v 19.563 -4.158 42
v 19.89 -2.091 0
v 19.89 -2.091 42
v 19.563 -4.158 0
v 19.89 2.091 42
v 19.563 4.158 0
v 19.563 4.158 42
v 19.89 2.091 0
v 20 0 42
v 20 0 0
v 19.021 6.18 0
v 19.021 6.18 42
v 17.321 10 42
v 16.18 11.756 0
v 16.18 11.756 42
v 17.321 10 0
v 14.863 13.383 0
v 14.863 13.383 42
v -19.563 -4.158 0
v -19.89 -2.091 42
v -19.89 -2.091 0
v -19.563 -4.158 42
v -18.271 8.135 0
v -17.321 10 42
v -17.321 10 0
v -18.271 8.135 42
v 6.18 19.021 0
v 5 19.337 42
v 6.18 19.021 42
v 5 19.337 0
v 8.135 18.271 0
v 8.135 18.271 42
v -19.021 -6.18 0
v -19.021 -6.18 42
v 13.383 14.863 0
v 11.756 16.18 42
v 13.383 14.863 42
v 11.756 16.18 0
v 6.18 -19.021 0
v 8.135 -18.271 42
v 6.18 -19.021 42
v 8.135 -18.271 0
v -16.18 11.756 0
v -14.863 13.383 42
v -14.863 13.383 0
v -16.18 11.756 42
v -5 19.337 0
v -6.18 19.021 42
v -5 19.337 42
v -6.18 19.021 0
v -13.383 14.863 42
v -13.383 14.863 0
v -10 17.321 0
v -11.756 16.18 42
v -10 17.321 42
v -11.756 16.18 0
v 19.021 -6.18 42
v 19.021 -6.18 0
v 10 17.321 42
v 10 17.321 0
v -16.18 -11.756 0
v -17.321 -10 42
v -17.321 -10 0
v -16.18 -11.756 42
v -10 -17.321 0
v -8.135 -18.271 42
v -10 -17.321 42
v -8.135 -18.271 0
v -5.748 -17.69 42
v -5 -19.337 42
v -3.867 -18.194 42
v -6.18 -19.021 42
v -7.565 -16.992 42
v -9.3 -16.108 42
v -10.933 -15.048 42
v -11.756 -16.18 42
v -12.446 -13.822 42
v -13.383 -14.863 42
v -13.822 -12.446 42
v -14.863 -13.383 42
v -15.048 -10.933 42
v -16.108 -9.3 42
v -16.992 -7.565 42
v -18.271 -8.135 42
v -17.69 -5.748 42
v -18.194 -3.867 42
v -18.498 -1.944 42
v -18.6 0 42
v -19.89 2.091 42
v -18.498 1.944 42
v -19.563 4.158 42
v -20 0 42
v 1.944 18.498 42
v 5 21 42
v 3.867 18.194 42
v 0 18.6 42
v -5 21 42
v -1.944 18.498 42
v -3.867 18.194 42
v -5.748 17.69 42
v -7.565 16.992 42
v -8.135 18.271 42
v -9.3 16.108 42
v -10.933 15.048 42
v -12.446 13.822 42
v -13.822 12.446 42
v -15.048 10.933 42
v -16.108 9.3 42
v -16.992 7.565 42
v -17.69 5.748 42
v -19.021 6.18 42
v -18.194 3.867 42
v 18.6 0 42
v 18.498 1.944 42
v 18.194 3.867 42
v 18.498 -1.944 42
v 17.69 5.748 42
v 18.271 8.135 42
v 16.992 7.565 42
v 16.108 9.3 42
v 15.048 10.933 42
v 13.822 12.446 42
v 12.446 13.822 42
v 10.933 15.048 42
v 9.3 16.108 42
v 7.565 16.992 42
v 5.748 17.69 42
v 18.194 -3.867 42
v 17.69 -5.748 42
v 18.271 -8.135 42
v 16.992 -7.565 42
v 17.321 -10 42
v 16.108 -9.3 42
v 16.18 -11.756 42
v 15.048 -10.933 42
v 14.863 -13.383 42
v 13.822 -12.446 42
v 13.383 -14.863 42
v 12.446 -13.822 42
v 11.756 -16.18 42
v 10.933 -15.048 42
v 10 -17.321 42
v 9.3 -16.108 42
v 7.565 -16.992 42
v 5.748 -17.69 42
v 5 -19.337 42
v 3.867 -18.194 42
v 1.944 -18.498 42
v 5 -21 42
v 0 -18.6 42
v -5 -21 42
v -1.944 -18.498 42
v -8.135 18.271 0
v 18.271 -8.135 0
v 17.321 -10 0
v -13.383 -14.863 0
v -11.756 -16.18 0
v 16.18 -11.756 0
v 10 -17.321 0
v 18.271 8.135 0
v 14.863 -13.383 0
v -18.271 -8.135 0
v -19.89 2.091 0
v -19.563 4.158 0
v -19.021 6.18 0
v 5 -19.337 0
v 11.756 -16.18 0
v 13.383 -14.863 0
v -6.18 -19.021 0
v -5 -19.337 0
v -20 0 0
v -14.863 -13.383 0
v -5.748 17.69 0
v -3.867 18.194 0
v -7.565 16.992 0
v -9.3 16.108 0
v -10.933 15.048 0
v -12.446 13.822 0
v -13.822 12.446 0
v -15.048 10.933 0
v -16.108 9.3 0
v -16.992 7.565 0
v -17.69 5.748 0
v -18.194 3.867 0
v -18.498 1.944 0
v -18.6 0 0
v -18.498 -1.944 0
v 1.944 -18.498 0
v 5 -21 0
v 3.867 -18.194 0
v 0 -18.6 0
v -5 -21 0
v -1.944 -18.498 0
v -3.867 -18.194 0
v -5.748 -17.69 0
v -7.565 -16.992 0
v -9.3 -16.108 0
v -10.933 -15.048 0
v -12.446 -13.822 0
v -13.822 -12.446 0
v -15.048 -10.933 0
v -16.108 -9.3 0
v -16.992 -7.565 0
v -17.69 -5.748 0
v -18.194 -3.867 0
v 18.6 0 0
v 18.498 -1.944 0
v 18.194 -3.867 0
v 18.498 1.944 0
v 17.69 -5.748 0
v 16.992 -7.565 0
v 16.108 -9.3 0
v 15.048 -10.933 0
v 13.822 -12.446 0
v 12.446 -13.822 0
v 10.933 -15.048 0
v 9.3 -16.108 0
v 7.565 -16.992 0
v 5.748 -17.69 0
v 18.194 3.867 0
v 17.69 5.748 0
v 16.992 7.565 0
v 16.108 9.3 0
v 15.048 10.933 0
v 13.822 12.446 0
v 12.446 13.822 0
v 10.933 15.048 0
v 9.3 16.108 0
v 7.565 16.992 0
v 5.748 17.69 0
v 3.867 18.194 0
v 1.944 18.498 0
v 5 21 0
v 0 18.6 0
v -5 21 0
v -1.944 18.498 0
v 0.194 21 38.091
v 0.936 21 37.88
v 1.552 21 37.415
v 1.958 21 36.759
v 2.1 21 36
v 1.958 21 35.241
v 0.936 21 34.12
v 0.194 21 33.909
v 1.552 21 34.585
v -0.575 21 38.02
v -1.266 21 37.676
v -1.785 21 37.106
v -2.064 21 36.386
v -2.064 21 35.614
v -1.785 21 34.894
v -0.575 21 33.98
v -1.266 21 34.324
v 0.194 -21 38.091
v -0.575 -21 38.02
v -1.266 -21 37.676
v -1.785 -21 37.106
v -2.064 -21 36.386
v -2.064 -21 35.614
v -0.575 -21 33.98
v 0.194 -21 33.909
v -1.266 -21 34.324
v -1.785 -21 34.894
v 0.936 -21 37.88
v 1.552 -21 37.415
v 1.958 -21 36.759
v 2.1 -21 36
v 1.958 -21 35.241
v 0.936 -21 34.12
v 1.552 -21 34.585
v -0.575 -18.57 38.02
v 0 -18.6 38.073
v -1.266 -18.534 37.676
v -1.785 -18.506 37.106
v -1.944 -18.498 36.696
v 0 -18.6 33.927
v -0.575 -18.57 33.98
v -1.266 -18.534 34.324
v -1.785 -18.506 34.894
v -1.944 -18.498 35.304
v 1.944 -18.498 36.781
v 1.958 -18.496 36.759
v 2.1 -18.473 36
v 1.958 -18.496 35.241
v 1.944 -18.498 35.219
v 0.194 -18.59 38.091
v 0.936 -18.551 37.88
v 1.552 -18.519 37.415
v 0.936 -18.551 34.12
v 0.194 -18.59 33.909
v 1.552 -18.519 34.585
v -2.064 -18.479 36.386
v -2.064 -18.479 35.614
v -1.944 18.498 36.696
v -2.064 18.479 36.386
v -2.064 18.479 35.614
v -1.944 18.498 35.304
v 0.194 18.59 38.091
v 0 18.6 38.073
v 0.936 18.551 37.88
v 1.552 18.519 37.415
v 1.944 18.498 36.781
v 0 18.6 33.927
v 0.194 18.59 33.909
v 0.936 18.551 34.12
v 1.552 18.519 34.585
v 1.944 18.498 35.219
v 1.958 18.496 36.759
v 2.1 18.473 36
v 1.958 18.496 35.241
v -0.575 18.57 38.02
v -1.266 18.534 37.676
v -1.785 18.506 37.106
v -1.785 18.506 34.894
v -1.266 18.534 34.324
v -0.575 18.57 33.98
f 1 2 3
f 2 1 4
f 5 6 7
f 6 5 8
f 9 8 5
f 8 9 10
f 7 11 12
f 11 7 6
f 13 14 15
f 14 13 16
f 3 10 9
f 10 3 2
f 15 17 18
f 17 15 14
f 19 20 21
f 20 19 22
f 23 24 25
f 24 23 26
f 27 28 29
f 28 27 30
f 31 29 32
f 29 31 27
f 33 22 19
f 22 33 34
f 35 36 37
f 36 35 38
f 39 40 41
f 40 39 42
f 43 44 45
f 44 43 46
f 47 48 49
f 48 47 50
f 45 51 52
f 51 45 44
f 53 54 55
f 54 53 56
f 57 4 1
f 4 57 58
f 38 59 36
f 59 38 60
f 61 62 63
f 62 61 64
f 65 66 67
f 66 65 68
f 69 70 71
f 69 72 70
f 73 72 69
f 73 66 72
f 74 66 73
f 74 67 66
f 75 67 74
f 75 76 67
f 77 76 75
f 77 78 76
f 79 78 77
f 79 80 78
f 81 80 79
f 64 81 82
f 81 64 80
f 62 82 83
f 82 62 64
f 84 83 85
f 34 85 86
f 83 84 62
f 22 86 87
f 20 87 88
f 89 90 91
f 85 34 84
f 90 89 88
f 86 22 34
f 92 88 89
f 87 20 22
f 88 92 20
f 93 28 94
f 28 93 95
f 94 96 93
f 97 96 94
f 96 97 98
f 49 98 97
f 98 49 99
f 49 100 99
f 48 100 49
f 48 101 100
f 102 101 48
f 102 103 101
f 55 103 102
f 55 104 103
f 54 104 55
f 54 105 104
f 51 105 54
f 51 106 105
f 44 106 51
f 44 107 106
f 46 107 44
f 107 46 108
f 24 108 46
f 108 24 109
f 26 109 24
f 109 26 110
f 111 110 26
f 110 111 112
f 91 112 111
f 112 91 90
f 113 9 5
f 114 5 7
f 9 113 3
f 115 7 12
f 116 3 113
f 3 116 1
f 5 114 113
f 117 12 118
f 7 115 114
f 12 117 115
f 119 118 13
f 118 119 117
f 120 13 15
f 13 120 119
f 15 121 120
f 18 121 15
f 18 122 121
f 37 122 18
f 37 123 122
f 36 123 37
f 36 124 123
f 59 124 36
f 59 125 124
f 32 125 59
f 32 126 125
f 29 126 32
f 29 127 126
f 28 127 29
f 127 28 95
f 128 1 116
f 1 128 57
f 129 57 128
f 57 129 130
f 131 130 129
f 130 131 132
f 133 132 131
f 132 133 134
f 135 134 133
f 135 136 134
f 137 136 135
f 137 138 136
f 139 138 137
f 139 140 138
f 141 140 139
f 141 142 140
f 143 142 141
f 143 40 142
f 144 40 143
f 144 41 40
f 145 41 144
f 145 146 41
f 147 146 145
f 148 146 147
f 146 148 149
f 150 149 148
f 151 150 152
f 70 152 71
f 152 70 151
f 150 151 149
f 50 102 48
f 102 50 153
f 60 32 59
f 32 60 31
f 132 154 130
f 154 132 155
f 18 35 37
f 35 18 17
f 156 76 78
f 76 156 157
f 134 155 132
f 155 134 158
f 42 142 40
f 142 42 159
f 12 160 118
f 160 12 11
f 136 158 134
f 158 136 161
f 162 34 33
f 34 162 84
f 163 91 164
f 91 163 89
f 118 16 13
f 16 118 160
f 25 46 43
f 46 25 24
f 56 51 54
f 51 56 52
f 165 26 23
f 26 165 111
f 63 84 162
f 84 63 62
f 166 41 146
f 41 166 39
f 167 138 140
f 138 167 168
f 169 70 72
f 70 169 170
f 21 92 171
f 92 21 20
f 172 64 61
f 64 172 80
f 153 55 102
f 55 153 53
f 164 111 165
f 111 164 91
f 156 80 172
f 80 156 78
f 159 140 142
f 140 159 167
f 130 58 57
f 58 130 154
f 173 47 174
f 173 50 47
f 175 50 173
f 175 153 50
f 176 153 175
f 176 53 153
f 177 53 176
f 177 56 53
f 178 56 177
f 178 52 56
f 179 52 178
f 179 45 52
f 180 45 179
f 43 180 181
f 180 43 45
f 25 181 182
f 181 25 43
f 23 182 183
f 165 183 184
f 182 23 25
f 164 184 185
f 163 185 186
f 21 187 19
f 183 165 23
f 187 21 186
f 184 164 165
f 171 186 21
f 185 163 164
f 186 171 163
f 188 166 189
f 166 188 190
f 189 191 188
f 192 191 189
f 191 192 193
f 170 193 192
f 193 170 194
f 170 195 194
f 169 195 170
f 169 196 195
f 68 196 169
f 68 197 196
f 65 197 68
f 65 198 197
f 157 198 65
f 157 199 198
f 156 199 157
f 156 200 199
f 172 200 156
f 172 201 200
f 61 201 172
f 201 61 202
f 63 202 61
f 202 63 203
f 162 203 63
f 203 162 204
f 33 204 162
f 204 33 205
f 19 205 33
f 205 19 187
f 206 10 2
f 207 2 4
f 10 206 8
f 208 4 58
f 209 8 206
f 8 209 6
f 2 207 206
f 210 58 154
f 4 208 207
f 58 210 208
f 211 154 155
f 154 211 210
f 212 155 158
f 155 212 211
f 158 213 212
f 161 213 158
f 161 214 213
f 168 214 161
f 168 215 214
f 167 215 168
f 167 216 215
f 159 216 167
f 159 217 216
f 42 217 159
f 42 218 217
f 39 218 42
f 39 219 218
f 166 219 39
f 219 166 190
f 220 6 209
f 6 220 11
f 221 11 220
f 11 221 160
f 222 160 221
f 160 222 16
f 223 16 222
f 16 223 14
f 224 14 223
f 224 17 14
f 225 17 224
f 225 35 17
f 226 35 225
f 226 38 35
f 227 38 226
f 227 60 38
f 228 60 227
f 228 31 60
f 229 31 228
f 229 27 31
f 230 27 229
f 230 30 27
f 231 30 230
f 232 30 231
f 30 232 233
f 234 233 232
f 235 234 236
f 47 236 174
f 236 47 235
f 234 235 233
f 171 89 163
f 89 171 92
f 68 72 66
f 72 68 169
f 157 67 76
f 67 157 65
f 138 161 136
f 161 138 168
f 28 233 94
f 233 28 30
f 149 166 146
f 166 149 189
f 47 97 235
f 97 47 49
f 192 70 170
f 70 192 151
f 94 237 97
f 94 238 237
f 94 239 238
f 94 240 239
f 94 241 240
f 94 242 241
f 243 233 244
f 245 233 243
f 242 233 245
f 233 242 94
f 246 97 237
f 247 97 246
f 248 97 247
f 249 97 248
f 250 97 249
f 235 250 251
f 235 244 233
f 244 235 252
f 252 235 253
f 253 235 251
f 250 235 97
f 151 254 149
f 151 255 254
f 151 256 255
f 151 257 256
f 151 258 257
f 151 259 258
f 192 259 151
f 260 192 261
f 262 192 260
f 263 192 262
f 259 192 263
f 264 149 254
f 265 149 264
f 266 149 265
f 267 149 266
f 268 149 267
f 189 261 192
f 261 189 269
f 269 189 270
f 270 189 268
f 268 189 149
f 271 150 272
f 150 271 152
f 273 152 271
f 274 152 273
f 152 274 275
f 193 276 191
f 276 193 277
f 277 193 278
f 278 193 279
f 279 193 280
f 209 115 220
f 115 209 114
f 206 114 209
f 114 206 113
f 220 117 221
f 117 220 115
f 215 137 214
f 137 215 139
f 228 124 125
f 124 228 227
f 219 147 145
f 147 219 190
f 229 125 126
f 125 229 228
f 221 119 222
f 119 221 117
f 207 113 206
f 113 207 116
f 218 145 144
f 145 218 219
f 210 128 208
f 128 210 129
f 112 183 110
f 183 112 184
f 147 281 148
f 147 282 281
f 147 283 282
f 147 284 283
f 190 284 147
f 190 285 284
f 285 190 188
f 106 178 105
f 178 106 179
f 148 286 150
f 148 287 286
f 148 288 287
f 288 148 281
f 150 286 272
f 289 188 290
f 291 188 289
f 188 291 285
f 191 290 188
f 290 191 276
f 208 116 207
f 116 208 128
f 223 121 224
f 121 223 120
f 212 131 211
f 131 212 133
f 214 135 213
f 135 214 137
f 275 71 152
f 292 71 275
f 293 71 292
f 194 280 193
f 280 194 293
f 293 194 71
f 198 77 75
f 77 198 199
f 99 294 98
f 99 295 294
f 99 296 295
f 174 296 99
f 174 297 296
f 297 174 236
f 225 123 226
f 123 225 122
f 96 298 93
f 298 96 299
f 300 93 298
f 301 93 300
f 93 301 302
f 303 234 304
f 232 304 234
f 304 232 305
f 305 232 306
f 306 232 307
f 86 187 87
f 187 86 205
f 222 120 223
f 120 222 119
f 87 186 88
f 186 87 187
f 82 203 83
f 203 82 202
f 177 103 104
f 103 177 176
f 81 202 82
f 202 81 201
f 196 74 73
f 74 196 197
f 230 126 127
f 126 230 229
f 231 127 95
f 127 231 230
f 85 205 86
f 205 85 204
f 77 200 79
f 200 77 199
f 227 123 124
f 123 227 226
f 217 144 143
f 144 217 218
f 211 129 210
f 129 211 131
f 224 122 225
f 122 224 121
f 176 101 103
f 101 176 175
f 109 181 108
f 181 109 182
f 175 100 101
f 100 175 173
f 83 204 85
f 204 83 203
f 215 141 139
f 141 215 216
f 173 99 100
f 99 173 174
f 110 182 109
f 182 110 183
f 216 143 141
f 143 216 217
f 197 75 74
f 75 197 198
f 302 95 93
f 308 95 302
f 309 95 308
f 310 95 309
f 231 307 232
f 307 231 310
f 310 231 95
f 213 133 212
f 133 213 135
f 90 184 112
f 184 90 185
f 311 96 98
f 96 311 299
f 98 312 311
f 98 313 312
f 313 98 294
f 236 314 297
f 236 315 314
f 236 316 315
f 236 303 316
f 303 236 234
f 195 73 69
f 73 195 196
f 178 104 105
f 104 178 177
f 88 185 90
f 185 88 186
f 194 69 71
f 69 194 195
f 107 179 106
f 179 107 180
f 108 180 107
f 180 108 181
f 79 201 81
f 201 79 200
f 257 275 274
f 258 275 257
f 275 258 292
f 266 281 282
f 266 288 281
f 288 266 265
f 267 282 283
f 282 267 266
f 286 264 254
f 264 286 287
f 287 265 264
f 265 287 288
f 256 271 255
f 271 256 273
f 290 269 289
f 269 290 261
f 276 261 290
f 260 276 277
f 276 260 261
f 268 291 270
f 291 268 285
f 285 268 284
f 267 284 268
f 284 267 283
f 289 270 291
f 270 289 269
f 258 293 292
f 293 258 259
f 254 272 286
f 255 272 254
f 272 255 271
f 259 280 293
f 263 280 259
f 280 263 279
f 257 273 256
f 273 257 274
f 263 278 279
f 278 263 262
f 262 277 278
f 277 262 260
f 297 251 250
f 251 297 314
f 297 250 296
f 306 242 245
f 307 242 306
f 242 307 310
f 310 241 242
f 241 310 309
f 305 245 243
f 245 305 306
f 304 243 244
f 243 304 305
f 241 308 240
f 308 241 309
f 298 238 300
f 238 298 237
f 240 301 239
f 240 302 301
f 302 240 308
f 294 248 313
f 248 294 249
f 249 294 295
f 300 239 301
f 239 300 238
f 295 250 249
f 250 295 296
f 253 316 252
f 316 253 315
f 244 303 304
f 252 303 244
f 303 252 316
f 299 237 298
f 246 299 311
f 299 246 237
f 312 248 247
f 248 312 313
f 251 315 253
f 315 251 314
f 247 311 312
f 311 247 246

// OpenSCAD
// file: ../shapes.scad
FACES   = 180;
EPSILON = 0.1;
PIN	    = 2.54;


module tube(h=1, inner=0, outer=0, di=0, do=0) {
    rInner = inner > 0 ? inner : di / 2;
    rOuter = outer > 0 ? outer : do / 2;

	if (rInner >= rOuter) echo("ERROR in tube. rOuter must be > rInner.");

	difference() {
		cylinder(h=h, r=rOuter);
		translate([0,0,-EPSILON]) {
			cylinder(h=h + EPSILON*2, r=rInner);
		}
	}
}

module roundedRect(size, r, up="z")
{
	if (up == "x") {
		H = size[0];
		hull()
		{
			translate([0, r, r]) rotate([0, 90, 0]) cylinder(r=r, h=H);
			translate([0, size[1] - r, r]) rotate([0, 90, 0]) cylinder(r=r, h=H);
			translate([0, r, size[2] - r]) rotate([0, 90, 0]) cylinder(r=r, h=H);
			translate([0, size[1] - r, size[2] - r]) rotate([0, 90, 0]) cylinder(r=r, h=H);
		}
	}
	else if (up == "y") {
		H = size[1];
		hull()
		{
			translate([r, 0, r]) rotate([-90, 0, 0]) cylinder(r=r, h=H);
			translate([size[0] - r, 0, r]) rotate([-90, 0, 0]) cylinder(r=r, h=H);
			translate([r, 0, size[2] - r]) rotate([-90, 0, 0]) cylinder(r=r, h=H);
			translate([size[0] - r, 0, size[2] - r]) rotate([-90, 0, 0]) cylinder(r=r, h=H);
		}
	}
	else {
		H = size[2];
		hull()
		{
			translate([r, r, 0])  cylinder(r=r, h=H);
			translate([size[0] - r, r, 0])  cylinder(r=r, h=H);
			translate([r, size[1] - r, 0])  cylinder(r=r, h=H);
			translate([size[0] - r, size[1] - r, 0])  cylinder(r=r, h=H);
		}
	}
}

module cubePair(x, size)
{
	translate([x, 0, 0])
		cube(size=size);
	mirror([1,0,0]) translate([x, 0, 0])
		cube(size=size);
}

module polygonXY(h, points)
{
    linear_extrude(height = h) {
        polygon(points=points);
    }  
}

module polygonYZ(h, points)
{
    multmatrix(m = [ [0, 0, 1, 0],
    				 [1, 0, 0, 0],
    				 [0, 1, 0, 0],
    				 [0, 0, 0, 1]
       			   ])
    linear_extrude(height = h) {
        polygon(points=points);
    }  	
}

module polygonZY(h, points)
{
    multmatrix(m = [ [0, 0, 1, 0],
    				 [0, 1, 0, 0],
    				 [1, 0, 0, 0],
    				 [0, 0, 0, 1]
       			   ])
    linear_extrude(height = h) {
        polygon(points=points);
    }  	
}
module polygonXZ(h, points)
{
    multmatrix(m = [ [1, 0, 0, 0],
    				 [0, 0, 1, 0],
    				 [0, 1, 0, 0],
    				 [0, 0, 0, 1]
       			   ])
    linear_extrude(height = h) {
        polygon(points=points);
    }  	
}


module zCapsule(dz0, dz1, r, roundedRect=0)
{
	if (roundedRect == 0) {
		hull() {
			translate([0, 0, dz0]) rotate([-90, 0, 0]) cylinder(h=50, r=r);
			translate([0, 0, dz1]) rotate([-90, 0, 0]) cylinder(h=50, r=r);
		}
	}
	else {
		if (dz1 < dz0) {
			t = dz0;
			dz0 = dz1;
			dz1 = t;
		}
		hull() {
			translate([r - roundedRect, 0, dz0 - r + roundedRect]) 
				rotate([-90, 0, 0]) cylinder(h=50, r=roundedRect);
			translate([-r + roundedRect, 0, dz0 - r + roundedRect]) 
				rotate([-90, 0, 0]) cylinder(h=50, r=roundedRect);
			translate([r - roundedRect, 0, dz1 + r - roundedRect]) 
				rotate([-90, 0, 0]) cylinder(h=50, r=roundedRect);
			translate([-r + roundedRect, 0, dz1 + r - roundedRect]) 
				rotate([-90, 0, 0]) cylinder(h=50, r=roundedRect);
		}
	}
}

module xRoofCube(size)
{
	x = size[0];
	y = size[1];
	z = size[2];

	polygonXY(h=z, points=[
		[0, 0],
		[x, 0],
		[x, y + x],		// gets the 45 degree angle for printing
		[0, y]
	]);
}

module tubeTriTop(h, do, di, theta=50) {
	tube(h=h, di=di, do=do);
	intersection() {
		cylinder(h=h, d=do);
		a = di / 2;
		b = a / tan(theta);
		union() {
			polygonXY(h=h, points=[
				[0, a], [a, a], [a, a - b]
			]);
			mirror([-1, 0, 0]) polygonXY(h=h, points=[
				[0, a], [a, a], [a, a - b]
			]);
		}
	}
}
// file: dim.scad
M_START = -28.5 + 10.5;
M0 = 0.0;
DZ_BODY = 101.8;
M_FRONT = DZ_BODY - 18.0;   // approximate

D0 = 31.7;

// See: Z_BATTERY_18650 = 65 + 4;
DZ_BATTERY = 65 + 4;

DZ_PCB = 0.975 * 25.4;
DY_PCB_TOP = 9.5;
DY_PCB_BOTTOM = DY_PCB_TOP - 1.6;
DZ_PCB_SECTION = 28.0;
PCB_OFFSET = 3;

// 5, 10, 15mm offsets
DY_PILLAR_TOP = DY_PCB_BOTTOM; // - 10.0;
DX_PCB = 0.90 * 25.4 + 0.2;

DZ_SPKR_HOLDER = 2.0;
DZ_BOLT = 8.0;

M_LED_CONTROL = 11.0;
DZ_LED_CONTROL = 1.45 * 25.4;
DX_LED_CONTROL = 0.7 * 25.4;

M_MC = M_START + DZ_SPKR_HOLDER;
M_BOLT = 65.0;
M_PCB = M_MC + DZ_BATTERY;
M_FORE_PLATE = M_PCB + DZ_PCB_SECTION;
// main file
include <dim.scad>
use <../shapes.scad>

$fa = 6;   // minimum angle (default 12)
$fs = 0.8;  // minimum size (default 2)

DROP = 36.0;
H = 42;

difference() 
{
    union() {
        cylinder(h=H, d=40);
        W = 10;
        D2 = 42;
        translate([-W/2, -D2/2, 0]) cube(size=[W, D2, H]);
    }
    translate([0, 0, -1]) cylinder(h=100, d=37.2);
    translate([0, 0, DROP]) rotate([90, 0, 0]) cylinder(h=100, d=4.2);
    translate([0, 0, DROP]) rotate([-90, 0, 0]) cylinder(h=100, d=4.2);
}
